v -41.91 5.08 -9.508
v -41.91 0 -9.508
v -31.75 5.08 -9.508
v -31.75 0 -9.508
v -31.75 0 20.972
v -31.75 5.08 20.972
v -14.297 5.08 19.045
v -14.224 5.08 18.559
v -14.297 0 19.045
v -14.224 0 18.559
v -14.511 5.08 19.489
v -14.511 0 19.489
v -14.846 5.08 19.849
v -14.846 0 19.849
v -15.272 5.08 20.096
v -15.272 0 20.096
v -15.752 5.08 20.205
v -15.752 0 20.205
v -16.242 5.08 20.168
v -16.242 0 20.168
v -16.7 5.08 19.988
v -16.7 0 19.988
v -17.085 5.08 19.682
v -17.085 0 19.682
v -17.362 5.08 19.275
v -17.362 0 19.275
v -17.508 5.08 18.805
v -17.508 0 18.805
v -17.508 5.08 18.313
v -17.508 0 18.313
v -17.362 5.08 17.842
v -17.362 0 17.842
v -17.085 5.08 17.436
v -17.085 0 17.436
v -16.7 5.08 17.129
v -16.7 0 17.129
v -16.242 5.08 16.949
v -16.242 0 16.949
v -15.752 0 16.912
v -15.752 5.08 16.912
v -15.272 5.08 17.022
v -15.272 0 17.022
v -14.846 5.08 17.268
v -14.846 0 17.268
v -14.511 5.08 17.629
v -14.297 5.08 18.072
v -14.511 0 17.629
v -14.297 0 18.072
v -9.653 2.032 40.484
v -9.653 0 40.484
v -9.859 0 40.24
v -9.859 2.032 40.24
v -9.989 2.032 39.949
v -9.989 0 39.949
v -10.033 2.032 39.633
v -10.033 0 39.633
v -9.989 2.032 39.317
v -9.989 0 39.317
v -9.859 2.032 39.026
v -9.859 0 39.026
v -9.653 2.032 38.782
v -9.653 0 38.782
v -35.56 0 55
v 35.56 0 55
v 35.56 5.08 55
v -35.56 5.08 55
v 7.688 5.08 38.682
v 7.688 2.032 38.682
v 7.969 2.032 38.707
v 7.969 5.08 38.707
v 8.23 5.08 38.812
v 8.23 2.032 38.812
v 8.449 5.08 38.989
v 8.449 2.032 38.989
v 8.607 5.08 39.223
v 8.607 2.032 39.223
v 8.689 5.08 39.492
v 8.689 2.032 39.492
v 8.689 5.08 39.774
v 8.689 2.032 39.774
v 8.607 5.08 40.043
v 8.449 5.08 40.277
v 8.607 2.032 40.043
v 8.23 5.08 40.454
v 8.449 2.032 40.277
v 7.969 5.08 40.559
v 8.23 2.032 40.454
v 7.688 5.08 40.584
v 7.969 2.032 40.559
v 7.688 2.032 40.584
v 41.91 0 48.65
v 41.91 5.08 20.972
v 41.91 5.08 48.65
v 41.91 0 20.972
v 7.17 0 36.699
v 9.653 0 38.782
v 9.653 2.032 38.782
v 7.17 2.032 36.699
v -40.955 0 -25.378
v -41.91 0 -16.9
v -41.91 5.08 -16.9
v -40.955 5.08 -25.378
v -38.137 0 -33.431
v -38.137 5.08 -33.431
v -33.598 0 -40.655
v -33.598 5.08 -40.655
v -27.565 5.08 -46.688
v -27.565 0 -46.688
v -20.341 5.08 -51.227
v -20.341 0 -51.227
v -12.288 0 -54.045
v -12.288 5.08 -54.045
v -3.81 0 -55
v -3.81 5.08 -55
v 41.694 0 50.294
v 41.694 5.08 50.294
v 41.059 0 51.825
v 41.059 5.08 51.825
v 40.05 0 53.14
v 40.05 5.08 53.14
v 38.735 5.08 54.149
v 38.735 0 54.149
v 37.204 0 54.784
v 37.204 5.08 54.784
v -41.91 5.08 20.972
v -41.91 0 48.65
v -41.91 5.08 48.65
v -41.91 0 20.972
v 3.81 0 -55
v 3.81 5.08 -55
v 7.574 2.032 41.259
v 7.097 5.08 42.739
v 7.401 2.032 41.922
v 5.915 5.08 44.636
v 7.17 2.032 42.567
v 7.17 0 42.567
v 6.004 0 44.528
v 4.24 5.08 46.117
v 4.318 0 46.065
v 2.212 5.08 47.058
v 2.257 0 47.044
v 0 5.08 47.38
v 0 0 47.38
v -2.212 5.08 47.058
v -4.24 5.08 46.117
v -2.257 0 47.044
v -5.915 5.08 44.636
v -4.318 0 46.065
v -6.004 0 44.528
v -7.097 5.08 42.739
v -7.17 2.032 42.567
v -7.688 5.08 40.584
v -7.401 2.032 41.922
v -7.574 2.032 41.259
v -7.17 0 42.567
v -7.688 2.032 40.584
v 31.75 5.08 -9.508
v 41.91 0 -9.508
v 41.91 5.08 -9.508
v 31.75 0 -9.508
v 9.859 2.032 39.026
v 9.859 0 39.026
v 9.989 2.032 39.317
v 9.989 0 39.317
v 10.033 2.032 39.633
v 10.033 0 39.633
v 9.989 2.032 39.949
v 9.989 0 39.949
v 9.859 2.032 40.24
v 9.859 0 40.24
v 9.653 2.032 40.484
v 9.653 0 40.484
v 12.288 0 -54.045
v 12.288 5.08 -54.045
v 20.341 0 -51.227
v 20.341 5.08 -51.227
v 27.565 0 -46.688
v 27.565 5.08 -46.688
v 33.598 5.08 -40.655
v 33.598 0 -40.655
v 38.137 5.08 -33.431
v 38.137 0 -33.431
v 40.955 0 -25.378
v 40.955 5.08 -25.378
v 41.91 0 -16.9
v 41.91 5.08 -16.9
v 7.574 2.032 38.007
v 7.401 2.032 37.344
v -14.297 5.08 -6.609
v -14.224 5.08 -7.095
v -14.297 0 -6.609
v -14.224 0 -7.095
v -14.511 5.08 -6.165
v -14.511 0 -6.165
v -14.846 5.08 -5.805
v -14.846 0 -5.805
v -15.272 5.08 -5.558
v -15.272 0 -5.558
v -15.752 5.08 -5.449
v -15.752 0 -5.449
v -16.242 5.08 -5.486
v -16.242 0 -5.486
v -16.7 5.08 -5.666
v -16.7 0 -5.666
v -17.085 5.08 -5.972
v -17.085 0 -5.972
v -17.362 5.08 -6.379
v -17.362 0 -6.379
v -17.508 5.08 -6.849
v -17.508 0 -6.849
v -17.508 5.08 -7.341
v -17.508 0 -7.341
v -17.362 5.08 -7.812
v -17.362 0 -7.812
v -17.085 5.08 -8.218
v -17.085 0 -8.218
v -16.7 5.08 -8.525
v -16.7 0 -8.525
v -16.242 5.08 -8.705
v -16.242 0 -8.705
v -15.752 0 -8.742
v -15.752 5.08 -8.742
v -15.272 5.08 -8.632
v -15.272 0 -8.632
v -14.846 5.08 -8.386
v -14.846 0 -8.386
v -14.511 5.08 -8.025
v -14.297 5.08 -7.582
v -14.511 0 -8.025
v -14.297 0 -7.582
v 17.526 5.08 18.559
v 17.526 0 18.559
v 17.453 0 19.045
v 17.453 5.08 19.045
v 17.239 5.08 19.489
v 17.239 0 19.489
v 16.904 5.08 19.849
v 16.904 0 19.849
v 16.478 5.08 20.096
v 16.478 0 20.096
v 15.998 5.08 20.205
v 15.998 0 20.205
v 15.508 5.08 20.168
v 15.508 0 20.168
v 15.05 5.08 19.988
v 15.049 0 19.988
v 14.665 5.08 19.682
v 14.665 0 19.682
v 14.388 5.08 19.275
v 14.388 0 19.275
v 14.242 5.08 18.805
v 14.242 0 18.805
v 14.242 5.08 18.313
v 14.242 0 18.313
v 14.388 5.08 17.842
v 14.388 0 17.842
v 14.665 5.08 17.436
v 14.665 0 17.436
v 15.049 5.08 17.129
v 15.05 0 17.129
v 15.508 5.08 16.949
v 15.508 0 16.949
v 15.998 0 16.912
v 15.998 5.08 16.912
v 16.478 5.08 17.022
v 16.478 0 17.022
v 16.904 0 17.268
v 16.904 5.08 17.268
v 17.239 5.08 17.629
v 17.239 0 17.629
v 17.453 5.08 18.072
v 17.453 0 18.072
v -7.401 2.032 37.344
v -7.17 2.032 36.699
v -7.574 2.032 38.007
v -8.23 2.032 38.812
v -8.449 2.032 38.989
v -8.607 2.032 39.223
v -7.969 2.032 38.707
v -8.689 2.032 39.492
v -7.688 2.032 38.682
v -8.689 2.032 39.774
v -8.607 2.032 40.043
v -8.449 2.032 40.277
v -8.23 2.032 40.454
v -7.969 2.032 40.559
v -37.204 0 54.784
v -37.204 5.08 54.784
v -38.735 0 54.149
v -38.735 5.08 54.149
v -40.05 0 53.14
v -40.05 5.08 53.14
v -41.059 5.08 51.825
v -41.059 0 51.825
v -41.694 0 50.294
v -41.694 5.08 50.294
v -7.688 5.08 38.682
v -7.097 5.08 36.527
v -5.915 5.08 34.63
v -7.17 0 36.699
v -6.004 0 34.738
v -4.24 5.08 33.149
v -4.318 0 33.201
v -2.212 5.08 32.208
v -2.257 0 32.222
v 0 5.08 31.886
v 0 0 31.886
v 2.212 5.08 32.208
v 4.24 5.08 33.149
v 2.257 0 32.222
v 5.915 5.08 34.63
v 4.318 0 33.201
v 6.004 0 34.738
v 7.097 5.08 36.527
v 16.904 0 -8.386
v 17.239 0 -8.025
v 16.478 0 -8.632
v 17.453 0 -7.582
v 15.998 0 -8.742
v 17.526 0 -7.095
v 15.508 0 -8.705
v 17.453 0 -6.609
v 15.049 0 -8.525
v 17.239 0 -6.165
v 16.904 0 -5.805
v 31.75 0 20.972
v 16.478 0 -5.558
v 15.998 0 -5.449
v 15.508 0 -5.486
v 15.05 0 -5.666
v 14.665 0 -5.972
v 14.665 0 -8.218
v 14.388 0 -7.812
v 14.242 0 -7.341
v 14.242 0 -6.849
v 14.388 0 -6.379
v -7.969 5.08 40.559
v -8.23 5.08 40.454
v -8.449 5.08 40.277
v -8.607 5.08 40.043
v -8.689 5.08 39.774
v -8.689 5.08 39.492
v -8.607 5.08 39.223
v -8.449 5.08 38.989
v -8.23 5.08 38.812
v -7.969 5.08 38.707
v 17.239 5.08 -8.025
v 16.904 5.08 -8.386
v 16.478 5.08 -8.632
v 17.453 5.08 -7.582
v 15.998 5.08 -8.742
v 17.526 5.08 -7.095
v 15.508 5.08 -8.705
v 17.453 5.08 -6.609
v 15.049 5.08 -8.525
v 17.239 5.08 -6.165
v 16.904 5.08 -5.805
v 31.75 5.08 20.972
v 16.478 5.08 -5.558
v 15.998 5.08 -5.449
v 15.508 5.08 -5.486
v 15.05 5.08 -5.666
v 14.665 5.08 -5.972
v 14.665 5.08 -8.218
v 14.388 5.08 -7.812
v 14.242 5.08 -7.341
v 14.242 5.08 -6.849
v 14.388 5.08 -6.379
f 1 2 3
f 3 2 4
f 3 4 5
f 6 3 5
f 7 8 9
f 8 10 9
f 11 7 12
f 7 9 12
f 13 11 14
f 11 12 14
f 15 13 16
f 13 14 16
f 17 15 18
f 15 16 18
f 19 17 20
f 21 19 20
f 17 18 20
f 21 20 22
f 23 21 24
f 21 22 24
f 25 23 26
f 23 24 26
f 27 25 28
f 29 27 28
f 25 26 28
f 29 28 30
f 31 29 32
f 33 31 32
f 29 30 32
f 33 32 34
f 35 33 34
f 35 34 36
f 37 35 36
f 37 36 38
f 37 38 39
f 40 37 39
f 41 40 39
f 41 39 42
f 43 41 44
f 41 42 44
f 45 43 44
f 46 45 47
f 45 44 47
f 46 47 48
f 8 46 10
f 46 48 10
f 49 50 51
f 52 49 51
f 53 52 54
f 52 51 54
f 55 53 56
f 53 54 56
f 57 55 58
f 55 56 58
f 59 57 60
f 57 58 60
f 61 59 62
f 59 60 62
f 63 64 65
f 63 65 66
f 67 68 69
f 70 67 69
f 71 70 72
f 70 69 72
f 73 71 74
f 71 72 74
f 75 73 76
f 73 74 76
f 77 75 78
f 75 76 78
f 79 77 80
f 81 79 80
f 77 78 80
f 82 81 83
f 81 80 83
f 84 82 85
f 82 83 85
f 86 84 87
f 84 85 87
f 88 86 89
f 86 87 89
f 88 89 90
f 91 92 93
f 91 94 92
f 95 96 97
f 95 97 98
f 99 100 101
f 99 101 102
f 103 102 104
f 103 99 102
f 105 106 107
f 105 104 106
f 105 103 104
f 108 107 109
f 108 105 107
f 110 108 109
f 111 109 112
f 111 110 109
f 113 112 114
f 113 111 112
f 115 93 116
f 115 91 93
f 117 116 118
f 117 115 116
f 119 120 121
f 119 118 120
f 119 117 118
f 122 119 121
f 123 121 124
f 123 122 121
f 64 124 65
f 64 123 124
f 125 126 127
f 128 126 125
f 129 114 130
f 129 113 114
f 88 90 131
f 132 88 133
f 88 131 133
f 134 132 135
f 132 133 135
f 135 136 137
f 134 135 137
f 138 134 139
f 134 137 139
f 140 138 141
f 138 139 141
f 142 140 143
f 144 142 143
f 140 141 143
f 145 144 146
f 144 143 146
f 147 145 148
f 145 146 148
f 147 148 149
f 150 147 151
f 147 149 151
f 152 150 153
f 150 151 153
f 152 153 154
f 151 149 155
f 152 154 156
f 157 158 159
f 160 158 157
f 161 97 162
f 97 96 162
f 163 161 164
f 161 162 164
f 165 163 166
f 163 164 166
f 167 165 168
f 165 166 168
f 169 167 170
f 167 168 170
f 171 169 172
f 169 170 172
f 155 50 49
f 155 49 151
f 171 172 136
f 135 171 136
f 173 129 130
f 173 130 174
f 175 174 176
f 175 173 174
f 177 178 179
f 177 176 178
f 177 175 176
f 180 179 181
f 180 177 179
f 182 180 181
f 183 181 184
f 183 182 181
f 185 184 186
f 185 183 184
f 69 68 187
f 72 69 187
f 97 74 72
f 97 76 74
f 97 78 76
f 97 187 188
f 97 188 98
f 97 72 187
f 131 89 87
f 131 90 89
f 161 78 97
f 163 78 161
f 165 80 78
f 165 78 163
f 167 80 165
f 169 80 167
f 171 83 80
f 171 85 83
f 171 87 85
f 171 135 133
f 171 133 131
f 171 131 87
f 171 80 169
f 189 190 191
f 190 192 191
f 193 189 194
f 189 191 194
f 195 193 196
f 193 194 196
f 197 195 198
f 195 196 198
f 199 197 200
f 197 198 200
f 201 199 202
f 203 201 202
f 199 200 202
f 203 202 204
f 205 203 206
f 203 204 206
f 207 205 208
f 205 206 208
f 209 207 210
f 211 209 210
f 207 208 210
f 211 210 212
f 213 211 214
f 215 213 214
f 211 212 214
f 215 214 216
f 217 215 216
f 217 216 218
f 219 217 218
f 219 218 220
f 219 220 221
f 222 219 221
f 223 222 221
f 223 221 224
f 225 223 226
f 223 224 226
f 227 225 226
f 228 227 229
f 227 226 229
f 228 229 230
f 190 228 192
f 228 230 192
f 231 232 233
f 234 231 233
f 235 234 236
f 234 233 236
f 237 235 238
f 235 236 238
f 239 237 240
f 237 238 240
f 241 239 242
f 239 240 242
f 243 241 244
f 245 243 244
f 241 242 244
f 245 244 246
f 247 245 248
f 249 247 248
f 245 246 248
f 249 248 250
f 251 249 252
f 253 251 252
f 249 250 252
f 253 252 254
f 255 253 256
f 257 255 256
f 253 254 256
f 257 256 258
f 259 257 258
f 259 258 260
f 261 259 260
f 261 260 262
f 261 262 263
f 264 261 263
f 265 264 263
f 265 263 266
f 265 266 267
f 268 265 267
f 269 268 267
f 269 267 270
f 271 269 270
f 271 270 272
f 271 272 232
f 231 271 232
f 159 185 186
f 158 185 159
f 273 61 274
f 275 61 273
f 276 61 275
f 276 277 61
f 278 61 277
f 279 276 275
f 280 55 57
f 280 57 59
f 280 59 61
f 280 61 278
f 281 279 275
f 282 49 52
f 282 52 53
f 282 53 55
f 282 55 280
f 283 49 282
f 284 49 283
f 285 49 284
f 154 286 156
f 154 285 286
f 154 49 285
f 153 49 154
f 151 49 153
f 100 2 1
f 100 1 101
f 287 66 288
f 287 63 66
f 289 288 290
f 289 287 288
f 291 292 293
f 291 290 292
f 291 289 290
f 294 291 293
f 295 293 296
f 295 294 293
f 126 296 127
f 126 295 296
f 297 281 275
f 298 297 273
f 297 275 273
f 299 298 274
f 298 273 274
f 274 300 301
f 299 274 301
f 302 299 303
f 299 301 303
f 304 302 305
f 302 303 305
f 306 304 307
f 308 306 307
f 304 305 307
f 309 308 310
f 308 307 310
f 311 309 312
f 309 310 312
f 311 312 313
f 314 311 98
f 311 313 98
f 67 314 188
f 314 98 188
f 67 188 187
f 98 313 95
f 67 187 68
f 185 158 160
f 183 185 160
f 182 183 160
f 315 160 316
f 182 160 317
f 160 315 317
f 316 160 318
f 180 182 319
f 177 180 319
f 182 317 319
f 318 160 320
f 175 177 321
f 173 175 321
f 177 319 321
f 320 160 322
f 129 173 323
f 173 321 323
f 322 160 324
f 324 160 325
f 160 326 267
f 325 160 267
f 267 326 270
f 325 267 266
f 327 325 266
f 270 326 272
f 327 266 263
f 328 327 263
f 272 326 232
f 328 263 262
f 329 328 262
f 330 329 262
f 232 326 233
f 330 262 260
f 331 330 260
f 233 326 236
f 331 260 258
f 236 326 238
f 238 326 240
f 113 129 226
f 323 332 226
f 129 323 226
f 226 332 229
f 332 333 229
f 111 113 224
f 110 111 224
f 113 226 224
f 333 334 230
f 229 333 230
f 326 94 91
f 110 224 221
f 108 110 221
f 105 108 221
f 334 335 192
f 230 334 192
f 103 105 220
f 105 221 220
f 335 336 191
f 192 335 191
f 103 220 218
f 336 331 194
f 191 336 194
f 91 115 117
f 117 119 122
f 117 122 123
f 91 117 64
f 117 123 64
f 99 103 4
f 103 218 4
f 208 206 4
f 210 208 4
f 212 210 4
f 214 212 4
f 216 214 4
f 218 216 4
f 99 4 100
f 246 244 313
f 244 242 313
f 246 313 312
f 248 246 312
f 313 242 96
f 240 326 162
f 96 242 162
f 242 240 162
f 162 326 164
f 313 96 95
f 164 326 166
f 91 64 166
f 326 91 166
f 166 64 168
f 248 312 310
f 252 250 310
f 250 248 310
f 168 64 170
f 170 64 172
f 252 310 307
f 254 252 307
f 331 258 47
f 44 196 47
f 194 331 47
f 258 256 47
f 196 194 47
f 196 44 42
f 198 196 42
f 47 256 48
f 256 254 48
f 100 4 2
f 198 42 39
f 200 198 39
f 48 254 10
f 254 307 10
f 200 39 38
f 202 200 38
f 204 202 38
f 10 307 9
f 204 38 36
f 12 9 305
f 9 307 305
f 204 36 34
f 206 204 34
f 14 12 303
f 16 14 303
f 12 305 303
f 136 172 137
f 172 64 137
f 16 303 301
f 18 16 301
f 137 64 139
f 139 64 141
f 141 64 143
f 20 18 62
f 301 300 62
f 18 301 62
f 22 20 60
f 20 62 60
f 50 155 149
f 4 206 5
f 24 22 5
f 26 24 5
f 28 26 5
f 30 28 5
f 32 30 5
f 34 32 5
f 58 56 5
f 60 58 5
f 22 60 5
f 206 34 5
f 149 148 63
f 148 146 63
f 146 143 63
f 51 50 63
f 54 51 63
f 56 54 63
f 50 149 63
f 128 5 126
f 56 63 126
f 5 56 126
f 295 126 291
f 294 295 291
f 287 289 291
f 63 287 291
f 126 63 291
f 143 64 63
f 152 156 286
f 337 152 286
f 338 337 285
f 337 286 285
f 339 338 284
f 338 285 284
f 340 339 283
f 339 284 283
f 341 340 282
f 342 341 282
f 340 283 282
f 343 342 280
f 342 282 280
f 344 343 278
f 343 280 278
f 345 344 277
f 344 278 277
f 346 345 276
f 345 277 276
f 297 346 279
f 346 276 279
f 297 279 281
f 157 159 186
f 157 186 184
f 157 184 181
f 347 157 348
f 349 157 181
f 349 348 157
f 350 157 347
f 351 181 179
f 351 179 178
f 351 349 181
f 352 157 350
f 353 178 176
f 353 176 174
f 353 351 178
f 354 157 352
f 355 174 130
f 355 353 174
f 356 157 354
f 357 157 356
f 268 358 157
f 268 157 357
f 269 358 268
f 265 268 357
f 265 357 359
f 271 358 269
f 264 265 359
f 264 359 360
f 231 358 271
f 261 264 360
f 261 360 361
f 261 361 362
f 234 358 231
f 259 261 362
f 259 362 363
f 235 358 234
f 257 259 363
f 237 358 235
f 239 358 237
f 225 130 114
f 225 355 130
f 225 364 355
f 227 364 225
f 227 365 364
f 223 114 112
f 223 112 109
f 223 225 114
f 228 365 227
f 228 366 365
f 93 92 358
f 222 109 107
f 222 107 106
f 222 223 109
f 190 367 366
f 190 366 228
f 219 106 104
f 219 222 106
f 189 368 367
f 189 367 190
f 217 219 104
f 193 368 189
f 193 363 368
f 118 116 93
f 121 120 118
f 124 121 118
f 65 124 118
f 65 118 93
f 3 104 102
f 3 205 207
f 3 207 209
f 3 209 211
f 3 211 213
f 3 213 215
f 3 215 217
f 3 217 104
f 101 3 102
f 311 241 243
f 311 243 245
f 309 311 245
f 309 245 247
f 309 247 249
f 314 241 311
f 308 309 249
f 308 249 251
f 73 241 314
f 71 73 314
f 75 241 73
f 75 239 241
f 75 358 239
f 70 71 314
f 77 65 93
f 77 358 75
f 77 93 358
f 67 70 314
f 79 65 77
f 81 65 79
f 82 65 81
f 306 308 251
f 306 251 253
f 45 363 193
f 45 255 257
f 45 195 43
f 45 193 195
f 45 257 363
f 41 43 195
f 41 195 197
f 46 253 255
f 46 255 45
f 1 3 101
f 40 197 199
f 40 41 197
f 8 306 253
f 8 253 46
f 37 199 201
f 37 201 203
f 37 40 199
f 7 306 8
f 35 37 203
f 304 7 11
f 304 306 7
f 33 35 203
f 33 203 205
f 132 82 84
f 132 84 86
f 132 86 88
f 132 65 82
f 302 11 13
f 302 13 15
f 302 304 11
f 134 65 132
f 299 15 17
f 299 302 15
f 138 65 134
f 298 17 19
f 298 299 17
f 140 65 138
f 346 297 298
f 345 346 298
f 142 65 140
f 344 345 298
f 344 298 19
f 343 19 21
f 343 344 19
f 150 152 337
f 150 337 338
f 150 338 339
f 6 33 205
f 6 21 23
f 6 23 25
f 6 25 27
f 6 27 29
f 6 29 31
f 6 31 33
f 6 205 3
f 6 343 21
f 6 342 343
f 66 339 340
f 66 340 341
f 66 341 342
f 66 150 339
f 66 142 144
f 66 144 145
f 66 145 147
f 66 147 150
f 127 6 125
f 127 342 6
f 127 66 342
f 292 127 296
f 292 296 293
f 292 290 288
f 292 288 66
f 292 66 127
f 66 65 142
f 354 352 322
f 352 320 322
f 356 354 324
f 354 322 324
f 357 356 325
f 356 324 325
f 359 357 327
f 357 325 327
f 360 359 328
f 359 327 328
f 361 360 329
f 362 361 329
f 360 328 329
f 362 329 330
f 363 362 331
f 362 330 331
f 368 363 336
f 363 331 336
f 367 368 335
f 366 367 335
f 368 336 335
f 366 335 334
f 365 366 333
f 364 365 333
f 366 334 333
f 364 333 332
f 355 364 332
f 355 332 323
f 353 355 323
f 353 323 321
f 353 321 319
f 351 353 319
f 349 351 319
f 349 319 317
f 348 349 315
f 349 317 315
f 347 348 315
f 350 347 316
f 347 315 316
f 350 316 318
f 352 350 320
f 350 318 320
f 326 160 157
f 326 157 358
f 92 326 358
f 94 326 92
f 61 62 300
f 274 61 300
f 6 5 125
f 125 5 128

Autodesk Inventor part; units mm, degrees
ref_plane "YZ Plane" through (0, 0, 0) normal (1, 0, 0) x (0, 1, 0)
ref_plane "XZ Plane" through (0, 0, 0) normal (0, 1, 0) x (-1, 0, 0)
ref_plane "XY Plane" through (0, 0, 0) normal (0, 0, 1) x (1, 0, 0)
sketch "Sketch1" plane through (0, 0, 0) normal (0, 1, 0) x (-1, 0, 0)
  line L0 (-35.56, 55) -> (35.56, 55)
  line L1 (41.91, 48.65) -> (41.91, -16.9)
  line L2 (3.81, -55) -> (-3.81, -55)
  line L3 (-41.91, -16.9) -> (-41.91, 48.65)
  line L4 (-41.91, 55) -> (41.91, -55) construction
  line L5 (41.91, 55) -> (-41.91, -55) construction
  arc A0 (3.81, -55) -> (41.91, -16.9) centre (3.81, -16.9) ccw
  arc A1 (-41.91, -16.9) -> (-3.81, -55) centre (-3.81, -16.9) ccw
  arc A2 (41.91, 48.65) -> (35.56, 55) centre (35.56, 48.65) ccw
  arc A3 (-35.56, 55) -> (-41.91, 48.65) centre (-35.56, 48.65) ccw
  line L6 (113.65, -53.500747) -> (-33.65, 85.250747) construction
  line L7 (-33.65, -53.500747) -> (113.65, 85.250747) construction
  line L8 (52.07, -9.508324) -> (31.75, -9.508324)
  line L9 (31.75, -9.508324) -> (31.75, 20.971676)
  line L10 (31.75, 20.971676) -> (52.07, 20.971676)
  line L11 (52.07, 20.971676) -> (52.07, -9.508324)
  line L12 (52.07, -9.508324) -> (31.75, 20.971676) construction
  line L13 (31.75, -9.508324) -> (52.07, 20.971676) construction
  line L14 (0, -55) -> (0, 55)
  line L15 (33.65, -53.500747) -> (-113.65, 85.250747) construction
  line L16 (-52.07, -9.508324) -> (-31.75, -9.508324)
  line L17 (-31.75, -9.508324) -> (-31.75, 20.971676)
  line L18 (-31.75, 20.971676) -> (-52.07, 20.971676)
  line L19 (-52.07, 20.971676) -> (-52.07, -9.508324)
  line L20 (-52.07, -9.508324) -> (-31.75, 20.971676) construction
  line L21 (-31.75, -9.508324) -> (-52.07, 20.971676) construction
  line L22 (-52.07, 20.971676) -> (-31.75, 20.971676)
  line L23 (-31.75, 20.971676) -> (-31.75, -9.508324)
  line L24 (-31.75, -9.508324) -> (-52.07, -9.508324)
  line L25 (-52.07, -9.508324) -> (-52.07, 20.971676)
  line L26 (-52.07, 20.971676) -> (-31.75, -9.508324) construction
  line L27 (-31.75, 20.971676) -> (-52.07, -9.508324) construction
  point P0 (0, 0)
  point P1 (-35.56, 48.65)
  point P2 (41.91, 5.731676)
  point P3 (-41.91, 5.731676)
  point P4 (-41.91, 5.731676)
  point P5 (41.91, -9.508324)
  point P6 (41.91, 20.971676)
  point P7 (-41.91, 20.971676)
  point P8 (-41.91, -9.508324)
  dimension "d0" = 83.82
  dimension "d1" = 110
  dimension "d2" = 38.1
  dimension "d3" = 38.1
  dimension "d4" = 6.35
  dimension "d5" = 6.35
  dimension "d11" = 20.32
  dimension "d12" = 30.48
extrude "Extrusion1" add sketch "Sketch1" along normal blind 5.08 contours L0 L14 L2 A1 L3 L16 L17 L18 A3 | L0 A2 L1 L10 L9 L8 A0 L2 L14
sketch "Sketch2" plane through (0, 0, 0) normal (0, -1, 0) x (1, 0, 0)
  line L0 (-35.56, 55) -> (35.56, 55)
  line L1 (0, 55) -> (0, 47.38)
  line L2 (0, 47.38) -> (0, 31.886)
  circle A0 centre (0, 39.633) radius 7.747
  line L3 (7.747, 39.633) -> (9.017, 39.633)
  circle A1 centre (9.017, 39.633) radius 1.27
  line L4 (9.756904, 38.600798) -> (7.196844, 36.765693) construction
  spline S0 degree 1 poles (9.756904, 38.600798) (7.196844, 36.765693) knots 1 1 2 2
  line L5 (9.770215, 40.65553) -> (7.167589, 42.572673) construction
  spline S1 degree 1 poles (9.770215, 40.65553) (7.167589, 42.572673) knots 1 1 2 2
  line L6 (-7.747, 39.633) -> (-9.017, 39.633)
  circle A2 centre (-9.017, 39.633) radius 1.27
  line L7 (-9.756904, 38.600798) -> (-7.196844, 36.765693) construction
  spline S2 degree 1 poles (-9.756904, 38.600798) (-7.196844, 36.765693) knots 1 1 2 2
  line L8 (-9.770215, 40.65553) -> (-7.167589, 42.572673) construction
  spline S3 degree 1 poles (-9.770215, 40.65553) (-7.167589, 42.572673) knots 1 1 2 2
  circle A3 centre (-9.017, 39.633) radius 1.27
  line L9 (-9.770215, 40.65553) -> (-7.167589, 42.572673) construction
  spline S4 degree 1 poles (-9.770215, 40.65553) (-7.167589, 42.572673) knots 1 1 2 2
  line L10 (-9.756904, 38.600798) -> (-7.196844, 36.765693) construction
  spline S5 degree 1 poles (-9.756904, 38.600798) (-7.196844, 36.765693) knots 1 1 2 2
  line L11 (10.287, 39.633) -> (10.287, 32.454774)
  line L12 (-10.287, 39.633) -> (-10.287, 31.176127)
  circle A4 centre (7.747, 39.633) radius 1.016
  line L13 (-7.747, 39.633) -> (-9.017, 39.633)
  circle A5 centre (-9.017, 39.633) radius 1.27
  circle A6 centre (-7.747, 39.633) radius 1.016
  circle A7 centre (-7.747, 39.633) radius 1.016
  point P0 (0, 0)
  dimension "d16" = 7.62
  dimension "d17" = 15.494
  dimension "d19" = 1.27
  dimension "d27" = 2.032
  dimension "d28" = 20.574
extrude "Extrusion2" cut sketch "Sketch2" against normal blind 5.08 contours A0 A4 L2 | L2 A0 A6 | A0 A4 | A6 A0
sketch "Sketch7" plane through (0, 0, 0) normal (0, -1, 0) x (1, 0, 0)
  circle A0 centre (0, 39.633) radius 7.747
  line L0 (7.747, 39.633) -> (8.89, 39.633)
  circle A1 centre (8.89, 39.633) radius 1.143
  circle A2 centre (7.747, 39.633) radius 0.9525
  line L1 (9.653215, 40.483854) -> (7.169913, 42.566999) construction
  spline S0 degree 1 poles (9.653215, 40.483854) (7.169913, 42.566999) knots 1 1 2 2
  line L2 (9.653215, 38.782146) -> (7.169913, 36.699001) construction
  spline S1 degree 1 poles (9.653215, 38.782146) (7.169913, 36.699001) knots 1 1 2 2
  line L3 (0, 47.38) -> (0, 31.886)
  circle A3 centre (-8.89, 39.633) radius 1.143
  line L4 (-9.653215, 40.483854) -> (-7.169913, 42.566999) construction
  spline S2 degree 1 poles (-9.653215, 40.483854) (-7.169913, 42.566999) knots 1 1 2 2
  line L5 (-9.653215, 38.782146) -> (-7.169913, 36.699001) construction
  spline S3 degree 1 poles (-9.653215, 38.782146) (-7.169913, 36.699001) knots 1 1 2 2
  circle A4 centre (-8.89, 39.633) radius 1.143
  line L6 (-9.653215, 40.483854) -> (-7.169913, 42.566999) construction
  spline S4 degree 1 poles (-9.653215, 40.483854) (-7.169913, 42.566999) knots 1 1 2 2
  line L7 (-9.653215, 38.782146) -> (-7.169913, 36.699001) construction
  spline S5 degree 1 poles (-9.653215, 38.782146) (-7.169913, 36.699001) knots 1 1 2 2
  point P0 (0, 0)
  dimension "d40" = 1.143
  dimension "d41" = 1.905
sketch "Sketch7 outline for Extrusion4" plane through (0, 0, 0) normal (0, -1, 0) x (1, 0, 0)
  spline S0 degree 1 poles (-9.653215, 40.483854) (-7.169913, 42.566999) knots 0 0 1 1
  arc A0 (-7.169913, 36.699001) -> (-7.169913, 42.566999) centre (0, 39.633) cw
  spline S1 degree 1 poles (-9.653215, 38.782146) (-7.169913, 36.699001) knots 0 0 1 1
  arc A1 (-9.653215, 40.483854) -> (-9.653215, 38.782146) centre (-8.89, 39.633) ccw
  spline S2 degree 1 poles (9.653215, 40.483854) (7.169913, 42.566999) knots 0 0 1 1
  arc A2 (9.653215, 38.782146) -> (9.653215, 40.483854) centre (8.89, 39.633) ccw
  spline S3 degree 1 poles (9.653215, 38.782146) (7.169913, 36.699001) knots 0 0 1 1
  arc A3 (7.169913, 42.566999) -> (7.169913, 36.699001) centre (0, 39.633) cw
extrude "Extrusion4" cut sketch "Sketch7 outline for Extrusion4" against normal blind 2.032
sketch "Sketch8" plane through (0, 0, 0) normal (0, -1, 0) x (1, 0, 0)
  arc A0 (7.169913, 36.699001) -> (7.169913, 42.566999) centre (0, 39.633) ccw
  circle A1 centre (7.747, 39.633) radius 0.9525
  line L0 (0, 47.38) -> (0, 31.886)
  circle A2 centre (-7.747, 39.633) radius 0.9525
  circle A3 centre (-7.747, 39.633) radius 0.9525
  point P0 (0, 0)
  dimension "d44" = 1.905
extrude "Extrusion5" cut sketch "Sketch8" against normal blind 5.08
sketch "Sketch9" plane through (0, 0, 0) normal (0, -1, 0) x (1, 0, 0)
  line L0 (31.75, 20.971676) -> (31.75, -9.508324)
  line L1 (31.75, 5.731676) -> (10.338001, 5.731676)
  line L2 (0, 23.8125) -> (0, -11.1125)
  line L3 (15.875, 5.731676) -> (15.875, 18.558676)
  line L4 (41.91, 18.558676) -> (15.875, 18.558676)
  line L5 (41.91, 48.65) -> (41.91, 20.971676)
  circle A0 centre (15.875, 18.558676) radius 1.651
  circle A1 centre (15.875, -7.095324) radius 1.651
  circle A2 centre (-15.875, 18.558676) radius 1.651
  circle A3 centre (-15.875, -7.095324) radius 1.651
  point P0 (0, 0)
  dimension "d51" = 12.827
  dimension "d52" = 26.035
  dimension "d53" = 3.302
extrude "Extrusion6" cut sketch "Sketch9" against normal blind 5.08 contours A0 L3 L4 | L4 L3 A0 | A1 | A2 | A3
properties part number "micromouse"
